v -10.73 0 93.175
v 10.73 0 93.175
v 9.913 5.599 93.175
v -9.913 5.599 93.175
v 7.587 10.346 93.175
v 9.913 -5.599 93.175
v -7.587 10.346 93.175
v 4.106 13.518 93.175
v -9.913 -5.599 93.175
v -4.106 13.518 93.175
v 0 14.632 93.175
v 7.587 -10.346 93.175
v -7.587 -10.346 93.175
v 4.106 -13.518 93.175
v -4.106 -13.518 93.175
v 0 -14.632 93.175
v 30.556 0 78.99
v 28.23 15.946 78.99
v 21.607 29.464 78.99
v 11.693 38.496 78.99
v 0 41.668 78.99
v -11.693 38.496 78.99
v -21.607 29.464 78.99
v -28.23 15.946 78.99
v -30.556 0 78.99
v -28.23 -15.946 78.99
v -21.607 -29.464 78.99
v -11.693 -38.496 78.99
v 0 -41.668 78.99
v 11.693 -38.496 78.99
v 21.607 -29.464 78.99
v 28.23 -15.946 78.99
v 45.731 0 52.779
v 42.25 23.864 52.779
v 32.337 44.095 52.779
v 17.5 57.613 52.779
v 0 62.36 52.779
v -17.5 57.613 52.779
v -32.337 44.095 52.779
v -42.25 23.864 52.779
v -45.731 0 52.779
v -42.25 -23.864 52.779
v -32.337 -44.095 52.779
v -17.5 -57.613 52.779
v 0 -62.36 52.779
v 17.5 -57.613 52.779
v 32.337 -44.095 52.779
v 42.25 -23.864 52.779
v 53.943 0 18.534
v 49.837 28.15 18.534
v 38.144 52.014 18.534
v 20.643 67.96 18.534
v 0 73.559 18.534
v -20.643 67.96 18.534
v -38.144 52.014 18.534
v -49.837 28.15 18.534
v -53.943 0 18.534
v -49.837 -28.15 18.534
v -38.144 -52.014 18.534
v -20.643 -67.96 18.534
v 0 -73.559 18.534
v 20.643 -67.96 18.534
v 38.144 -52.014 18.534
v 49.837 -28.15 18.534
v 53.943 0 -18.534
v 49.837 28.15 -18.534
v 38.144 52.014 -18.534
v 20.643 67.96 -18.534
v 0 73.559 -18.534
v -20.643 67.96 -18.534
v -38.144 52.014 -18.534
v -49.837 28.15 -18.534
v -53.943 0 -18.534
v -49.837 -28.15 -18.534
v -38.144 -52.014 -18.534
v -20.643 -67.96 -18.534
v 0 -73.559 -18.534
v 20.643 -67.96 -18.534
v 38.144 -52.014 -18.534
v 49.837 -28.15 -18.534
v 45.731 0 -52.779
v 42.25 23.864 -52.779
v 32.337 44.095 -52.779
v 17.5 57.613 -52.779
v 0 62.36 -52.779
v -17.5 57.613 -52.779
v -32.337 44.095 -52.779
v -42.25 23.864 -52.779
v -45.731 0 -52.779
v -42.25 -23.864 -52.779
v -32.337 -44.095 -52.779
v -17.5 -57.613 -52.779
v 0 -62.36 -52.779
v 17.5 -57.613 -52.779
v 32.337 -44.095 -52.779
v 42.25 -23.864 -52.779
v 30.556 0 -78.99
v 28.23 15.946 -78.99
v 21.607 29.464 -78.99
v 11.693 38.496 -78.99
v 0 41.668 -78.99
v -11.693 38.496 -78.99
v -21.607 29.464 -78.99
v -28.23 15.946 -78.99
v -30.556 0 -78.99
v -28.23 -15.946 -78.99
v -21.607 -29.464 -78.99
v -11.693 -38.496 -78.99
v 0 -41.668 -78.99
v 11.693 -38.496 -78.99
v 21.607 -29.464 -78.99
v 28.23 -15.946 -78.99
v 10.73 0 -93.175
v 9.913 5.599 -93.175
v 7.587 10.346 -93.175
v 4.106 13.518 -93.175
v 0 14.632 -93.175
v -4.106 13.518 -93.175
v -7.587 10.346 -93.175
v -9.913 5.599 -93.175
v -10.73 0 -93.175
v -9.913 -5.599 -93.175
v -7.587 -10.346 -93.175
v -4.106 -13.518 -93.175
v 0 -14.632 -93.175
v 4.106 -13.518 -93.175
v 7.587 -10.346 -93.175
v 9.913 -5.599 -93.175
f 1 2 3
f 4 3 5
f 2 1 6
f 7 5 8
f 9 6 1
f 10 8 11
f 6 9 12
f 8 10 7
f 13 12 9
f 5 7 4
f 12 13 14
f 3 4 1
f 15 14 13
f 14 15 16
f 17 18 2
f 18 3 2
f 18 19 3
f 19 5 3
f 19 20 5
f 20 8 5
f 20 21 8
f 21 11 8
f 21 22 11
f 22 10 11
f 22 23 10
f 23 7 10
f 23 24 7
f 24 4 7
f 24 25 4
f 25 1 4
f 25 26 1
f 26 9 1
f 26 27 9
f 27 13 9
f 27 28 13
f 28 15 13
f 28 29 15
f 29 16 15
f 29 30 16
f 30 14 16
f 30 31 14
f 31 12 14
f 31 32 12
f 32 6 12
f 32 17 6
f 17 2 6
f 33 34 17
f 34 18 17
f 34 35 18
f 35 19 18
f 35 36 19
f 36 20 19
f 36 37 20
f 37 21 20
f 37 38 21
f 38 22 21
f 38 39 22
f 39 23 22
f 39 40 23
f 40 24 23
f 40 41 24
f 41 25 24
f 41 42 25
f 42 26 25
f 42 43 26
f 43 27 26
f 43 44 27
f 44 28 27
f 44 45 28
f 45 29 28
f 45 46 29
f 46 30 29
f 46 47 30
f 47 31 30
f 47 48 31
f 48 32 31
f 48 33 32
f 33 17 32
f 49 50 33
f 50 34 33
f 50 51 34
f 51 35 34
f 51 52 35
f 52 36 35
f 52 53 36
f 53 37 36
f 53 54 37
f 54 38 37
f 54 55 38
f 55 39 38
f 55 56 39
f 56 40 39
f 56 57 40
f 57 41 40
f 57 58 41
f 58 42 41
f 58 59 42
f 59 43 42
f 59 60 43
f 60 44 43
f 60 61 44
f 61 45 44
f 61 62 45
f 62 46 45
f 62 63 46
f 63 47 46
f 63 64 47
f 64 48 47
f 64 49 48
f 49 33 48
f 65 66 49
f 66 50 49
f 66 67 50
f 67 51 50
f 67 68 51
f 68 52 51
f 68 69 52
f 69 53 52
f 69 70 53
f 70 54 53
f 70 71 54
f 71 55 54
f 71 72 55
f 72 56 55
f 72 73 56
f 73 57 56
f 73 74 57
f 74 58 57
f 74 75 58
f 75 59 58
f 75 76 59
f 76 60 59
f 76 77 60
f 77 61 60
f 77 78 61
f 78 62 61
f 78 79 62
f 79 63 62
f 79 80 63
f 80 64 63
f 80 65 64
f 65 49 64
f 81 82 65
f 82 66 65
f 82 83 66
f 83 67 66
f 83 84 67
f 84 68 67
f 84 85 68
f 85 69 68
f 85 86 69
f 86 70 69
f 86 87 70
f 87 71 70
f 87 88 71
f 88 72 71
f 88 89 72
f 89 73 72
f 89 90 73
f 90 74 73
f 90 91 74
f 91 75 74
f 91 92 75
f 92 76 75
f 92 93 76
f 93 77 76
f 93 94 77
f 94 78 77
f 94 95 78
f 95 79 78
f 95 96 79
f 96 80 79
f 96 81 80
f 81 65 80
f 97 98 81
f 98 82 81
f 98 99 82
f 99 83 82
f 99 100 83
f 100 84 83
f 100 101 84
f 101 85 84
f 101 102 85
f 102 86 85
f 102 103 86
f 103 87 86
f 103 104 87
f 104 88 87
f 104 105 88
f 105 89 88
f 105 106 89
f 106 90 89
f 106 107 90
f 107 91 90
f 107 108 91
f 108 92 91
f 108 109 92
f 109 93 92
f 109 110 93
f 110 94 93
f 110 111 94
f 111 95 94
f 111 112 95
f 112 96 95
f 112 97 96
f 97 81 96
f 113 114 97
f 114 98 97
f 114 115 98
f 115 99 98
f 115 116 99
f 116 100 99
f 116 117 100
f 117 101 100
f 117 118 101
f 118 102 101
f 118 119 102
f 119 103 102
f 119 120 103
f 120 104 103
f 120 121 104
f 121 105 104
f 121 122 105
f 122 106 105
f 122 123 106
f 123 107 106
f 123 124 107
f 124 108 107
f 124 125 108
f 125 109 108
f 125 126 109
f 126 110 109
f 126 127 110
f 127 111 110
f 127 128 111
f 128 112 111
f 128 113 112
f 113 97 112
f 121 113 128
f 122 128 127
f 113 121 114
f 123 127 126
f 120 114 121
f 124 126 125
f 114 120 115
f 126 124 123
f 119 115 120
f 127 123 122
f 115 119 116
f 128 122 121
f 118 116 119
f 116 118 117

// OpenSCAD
// Generated by SolidPython 1.0.1 on 2020-07-29 00:46:50


scale(v = [11, 15, 19]) {
	sphere(r = 5);
}
/***********************************************
*********      SolidPython code:      **********
************************************************
 
# import packages: SolidPython
from solid import *
from solid.utils import *
from itertools import chain, combinations, permutations


class Resize:

    def __init__(self, scad_file):
        self.scad_file = scad_file
        #self.scad_file = import_scad(scad_file)
        # cone/cylinder param:
        self.r1 = 0
        self.r2 = 0
        self.h = 0
        # rectangular prism param:
        self.w = 0
        self.l = 0
        # ellipse param:
        self.r = 0

    # import OpenScad code (file name corresponds to shape)


    # classify shape + parameters
    def assign(self, param1, param2, param3):
        if self.scad_file == 'cone.scad':
            self.r1 = param1
            self.r2 = param2
            self.h = param3
        elif self.scad_file == 'cylinder.scad':
            self.r1 = param1
            self.r2 = param2
            self.h = param3
        elif self.scad_file == 'rectangularPrism.scad':
            self.h = param1
            self.l = param2
            self.w = param3
        else:
            self.r = param1
            self.h = param2

    # resize parameters
    def iterate(self):
        x = range(3, 20, 2)
        i = 1
        if self.scad_file == 'cone.scad':
            tempList = list(permutations(x, 2))
            for temp in tempList:
                param1 = temp[0]
                param2 = temp[1]
                filepath = 'produced_scad_files/' + 'cone' + str(param1) + '_' + str(param2) + '_' + '.scad'
                scad_render_to_file(cylinder(h=param1, r1=param2, r2=0), filepath)

        elif self.scad_file == 'cylinder.scad':
            tempList = list(permutations(x, 3))
            for temp in tempList:
                param1 = temp[0]
                param2 = temp[1]
                filepath = 'produced_scad_files/' + 'cylinder' + str(param1) + '_' + str(param2) + '_' + '.scad'
                scad_render_to_file(cylinder(h=param1, r1=param2, r2=param2), filepath)

        elif self.scad_file == 'rectangularPrism.scad':
            tempList = list(permutations(x, 3))
            for temp in tempList:
                param1 = temp[0]
                param2 = temp[1]
                param3 = temp[2]
                filepath = 'produced_scad_files/' + 'rectangularPrism' + str(param1) + '_' + str(param2) + '_' + str(
                    param3) + '.scad'
                scad_render_to_file(cube(size=(param1, param2, param3)), filepath)

        elif self.scad_file == 'ellipse.scad':
            tempList = list(permutations(x, 4))
            for temp in tempList:
                param1 = temp[0]
                param2 = temp[1]
                param3 = temp[2]
                param4 = temp[3]
                filepath = 'produced_scad_files/' + 'ellipse' + str(param1) + '_' + str(param2) + '_' + str(param3) + '_' + str(param4) + '.scad'
                scad_render_to_file(scale([param1, param2, param3])(sphere(r=param4)), filepath)

    def render_to_scadfile(self):
        scad_render_to_file(scad, 'example.scad') 
 
************************************************/
